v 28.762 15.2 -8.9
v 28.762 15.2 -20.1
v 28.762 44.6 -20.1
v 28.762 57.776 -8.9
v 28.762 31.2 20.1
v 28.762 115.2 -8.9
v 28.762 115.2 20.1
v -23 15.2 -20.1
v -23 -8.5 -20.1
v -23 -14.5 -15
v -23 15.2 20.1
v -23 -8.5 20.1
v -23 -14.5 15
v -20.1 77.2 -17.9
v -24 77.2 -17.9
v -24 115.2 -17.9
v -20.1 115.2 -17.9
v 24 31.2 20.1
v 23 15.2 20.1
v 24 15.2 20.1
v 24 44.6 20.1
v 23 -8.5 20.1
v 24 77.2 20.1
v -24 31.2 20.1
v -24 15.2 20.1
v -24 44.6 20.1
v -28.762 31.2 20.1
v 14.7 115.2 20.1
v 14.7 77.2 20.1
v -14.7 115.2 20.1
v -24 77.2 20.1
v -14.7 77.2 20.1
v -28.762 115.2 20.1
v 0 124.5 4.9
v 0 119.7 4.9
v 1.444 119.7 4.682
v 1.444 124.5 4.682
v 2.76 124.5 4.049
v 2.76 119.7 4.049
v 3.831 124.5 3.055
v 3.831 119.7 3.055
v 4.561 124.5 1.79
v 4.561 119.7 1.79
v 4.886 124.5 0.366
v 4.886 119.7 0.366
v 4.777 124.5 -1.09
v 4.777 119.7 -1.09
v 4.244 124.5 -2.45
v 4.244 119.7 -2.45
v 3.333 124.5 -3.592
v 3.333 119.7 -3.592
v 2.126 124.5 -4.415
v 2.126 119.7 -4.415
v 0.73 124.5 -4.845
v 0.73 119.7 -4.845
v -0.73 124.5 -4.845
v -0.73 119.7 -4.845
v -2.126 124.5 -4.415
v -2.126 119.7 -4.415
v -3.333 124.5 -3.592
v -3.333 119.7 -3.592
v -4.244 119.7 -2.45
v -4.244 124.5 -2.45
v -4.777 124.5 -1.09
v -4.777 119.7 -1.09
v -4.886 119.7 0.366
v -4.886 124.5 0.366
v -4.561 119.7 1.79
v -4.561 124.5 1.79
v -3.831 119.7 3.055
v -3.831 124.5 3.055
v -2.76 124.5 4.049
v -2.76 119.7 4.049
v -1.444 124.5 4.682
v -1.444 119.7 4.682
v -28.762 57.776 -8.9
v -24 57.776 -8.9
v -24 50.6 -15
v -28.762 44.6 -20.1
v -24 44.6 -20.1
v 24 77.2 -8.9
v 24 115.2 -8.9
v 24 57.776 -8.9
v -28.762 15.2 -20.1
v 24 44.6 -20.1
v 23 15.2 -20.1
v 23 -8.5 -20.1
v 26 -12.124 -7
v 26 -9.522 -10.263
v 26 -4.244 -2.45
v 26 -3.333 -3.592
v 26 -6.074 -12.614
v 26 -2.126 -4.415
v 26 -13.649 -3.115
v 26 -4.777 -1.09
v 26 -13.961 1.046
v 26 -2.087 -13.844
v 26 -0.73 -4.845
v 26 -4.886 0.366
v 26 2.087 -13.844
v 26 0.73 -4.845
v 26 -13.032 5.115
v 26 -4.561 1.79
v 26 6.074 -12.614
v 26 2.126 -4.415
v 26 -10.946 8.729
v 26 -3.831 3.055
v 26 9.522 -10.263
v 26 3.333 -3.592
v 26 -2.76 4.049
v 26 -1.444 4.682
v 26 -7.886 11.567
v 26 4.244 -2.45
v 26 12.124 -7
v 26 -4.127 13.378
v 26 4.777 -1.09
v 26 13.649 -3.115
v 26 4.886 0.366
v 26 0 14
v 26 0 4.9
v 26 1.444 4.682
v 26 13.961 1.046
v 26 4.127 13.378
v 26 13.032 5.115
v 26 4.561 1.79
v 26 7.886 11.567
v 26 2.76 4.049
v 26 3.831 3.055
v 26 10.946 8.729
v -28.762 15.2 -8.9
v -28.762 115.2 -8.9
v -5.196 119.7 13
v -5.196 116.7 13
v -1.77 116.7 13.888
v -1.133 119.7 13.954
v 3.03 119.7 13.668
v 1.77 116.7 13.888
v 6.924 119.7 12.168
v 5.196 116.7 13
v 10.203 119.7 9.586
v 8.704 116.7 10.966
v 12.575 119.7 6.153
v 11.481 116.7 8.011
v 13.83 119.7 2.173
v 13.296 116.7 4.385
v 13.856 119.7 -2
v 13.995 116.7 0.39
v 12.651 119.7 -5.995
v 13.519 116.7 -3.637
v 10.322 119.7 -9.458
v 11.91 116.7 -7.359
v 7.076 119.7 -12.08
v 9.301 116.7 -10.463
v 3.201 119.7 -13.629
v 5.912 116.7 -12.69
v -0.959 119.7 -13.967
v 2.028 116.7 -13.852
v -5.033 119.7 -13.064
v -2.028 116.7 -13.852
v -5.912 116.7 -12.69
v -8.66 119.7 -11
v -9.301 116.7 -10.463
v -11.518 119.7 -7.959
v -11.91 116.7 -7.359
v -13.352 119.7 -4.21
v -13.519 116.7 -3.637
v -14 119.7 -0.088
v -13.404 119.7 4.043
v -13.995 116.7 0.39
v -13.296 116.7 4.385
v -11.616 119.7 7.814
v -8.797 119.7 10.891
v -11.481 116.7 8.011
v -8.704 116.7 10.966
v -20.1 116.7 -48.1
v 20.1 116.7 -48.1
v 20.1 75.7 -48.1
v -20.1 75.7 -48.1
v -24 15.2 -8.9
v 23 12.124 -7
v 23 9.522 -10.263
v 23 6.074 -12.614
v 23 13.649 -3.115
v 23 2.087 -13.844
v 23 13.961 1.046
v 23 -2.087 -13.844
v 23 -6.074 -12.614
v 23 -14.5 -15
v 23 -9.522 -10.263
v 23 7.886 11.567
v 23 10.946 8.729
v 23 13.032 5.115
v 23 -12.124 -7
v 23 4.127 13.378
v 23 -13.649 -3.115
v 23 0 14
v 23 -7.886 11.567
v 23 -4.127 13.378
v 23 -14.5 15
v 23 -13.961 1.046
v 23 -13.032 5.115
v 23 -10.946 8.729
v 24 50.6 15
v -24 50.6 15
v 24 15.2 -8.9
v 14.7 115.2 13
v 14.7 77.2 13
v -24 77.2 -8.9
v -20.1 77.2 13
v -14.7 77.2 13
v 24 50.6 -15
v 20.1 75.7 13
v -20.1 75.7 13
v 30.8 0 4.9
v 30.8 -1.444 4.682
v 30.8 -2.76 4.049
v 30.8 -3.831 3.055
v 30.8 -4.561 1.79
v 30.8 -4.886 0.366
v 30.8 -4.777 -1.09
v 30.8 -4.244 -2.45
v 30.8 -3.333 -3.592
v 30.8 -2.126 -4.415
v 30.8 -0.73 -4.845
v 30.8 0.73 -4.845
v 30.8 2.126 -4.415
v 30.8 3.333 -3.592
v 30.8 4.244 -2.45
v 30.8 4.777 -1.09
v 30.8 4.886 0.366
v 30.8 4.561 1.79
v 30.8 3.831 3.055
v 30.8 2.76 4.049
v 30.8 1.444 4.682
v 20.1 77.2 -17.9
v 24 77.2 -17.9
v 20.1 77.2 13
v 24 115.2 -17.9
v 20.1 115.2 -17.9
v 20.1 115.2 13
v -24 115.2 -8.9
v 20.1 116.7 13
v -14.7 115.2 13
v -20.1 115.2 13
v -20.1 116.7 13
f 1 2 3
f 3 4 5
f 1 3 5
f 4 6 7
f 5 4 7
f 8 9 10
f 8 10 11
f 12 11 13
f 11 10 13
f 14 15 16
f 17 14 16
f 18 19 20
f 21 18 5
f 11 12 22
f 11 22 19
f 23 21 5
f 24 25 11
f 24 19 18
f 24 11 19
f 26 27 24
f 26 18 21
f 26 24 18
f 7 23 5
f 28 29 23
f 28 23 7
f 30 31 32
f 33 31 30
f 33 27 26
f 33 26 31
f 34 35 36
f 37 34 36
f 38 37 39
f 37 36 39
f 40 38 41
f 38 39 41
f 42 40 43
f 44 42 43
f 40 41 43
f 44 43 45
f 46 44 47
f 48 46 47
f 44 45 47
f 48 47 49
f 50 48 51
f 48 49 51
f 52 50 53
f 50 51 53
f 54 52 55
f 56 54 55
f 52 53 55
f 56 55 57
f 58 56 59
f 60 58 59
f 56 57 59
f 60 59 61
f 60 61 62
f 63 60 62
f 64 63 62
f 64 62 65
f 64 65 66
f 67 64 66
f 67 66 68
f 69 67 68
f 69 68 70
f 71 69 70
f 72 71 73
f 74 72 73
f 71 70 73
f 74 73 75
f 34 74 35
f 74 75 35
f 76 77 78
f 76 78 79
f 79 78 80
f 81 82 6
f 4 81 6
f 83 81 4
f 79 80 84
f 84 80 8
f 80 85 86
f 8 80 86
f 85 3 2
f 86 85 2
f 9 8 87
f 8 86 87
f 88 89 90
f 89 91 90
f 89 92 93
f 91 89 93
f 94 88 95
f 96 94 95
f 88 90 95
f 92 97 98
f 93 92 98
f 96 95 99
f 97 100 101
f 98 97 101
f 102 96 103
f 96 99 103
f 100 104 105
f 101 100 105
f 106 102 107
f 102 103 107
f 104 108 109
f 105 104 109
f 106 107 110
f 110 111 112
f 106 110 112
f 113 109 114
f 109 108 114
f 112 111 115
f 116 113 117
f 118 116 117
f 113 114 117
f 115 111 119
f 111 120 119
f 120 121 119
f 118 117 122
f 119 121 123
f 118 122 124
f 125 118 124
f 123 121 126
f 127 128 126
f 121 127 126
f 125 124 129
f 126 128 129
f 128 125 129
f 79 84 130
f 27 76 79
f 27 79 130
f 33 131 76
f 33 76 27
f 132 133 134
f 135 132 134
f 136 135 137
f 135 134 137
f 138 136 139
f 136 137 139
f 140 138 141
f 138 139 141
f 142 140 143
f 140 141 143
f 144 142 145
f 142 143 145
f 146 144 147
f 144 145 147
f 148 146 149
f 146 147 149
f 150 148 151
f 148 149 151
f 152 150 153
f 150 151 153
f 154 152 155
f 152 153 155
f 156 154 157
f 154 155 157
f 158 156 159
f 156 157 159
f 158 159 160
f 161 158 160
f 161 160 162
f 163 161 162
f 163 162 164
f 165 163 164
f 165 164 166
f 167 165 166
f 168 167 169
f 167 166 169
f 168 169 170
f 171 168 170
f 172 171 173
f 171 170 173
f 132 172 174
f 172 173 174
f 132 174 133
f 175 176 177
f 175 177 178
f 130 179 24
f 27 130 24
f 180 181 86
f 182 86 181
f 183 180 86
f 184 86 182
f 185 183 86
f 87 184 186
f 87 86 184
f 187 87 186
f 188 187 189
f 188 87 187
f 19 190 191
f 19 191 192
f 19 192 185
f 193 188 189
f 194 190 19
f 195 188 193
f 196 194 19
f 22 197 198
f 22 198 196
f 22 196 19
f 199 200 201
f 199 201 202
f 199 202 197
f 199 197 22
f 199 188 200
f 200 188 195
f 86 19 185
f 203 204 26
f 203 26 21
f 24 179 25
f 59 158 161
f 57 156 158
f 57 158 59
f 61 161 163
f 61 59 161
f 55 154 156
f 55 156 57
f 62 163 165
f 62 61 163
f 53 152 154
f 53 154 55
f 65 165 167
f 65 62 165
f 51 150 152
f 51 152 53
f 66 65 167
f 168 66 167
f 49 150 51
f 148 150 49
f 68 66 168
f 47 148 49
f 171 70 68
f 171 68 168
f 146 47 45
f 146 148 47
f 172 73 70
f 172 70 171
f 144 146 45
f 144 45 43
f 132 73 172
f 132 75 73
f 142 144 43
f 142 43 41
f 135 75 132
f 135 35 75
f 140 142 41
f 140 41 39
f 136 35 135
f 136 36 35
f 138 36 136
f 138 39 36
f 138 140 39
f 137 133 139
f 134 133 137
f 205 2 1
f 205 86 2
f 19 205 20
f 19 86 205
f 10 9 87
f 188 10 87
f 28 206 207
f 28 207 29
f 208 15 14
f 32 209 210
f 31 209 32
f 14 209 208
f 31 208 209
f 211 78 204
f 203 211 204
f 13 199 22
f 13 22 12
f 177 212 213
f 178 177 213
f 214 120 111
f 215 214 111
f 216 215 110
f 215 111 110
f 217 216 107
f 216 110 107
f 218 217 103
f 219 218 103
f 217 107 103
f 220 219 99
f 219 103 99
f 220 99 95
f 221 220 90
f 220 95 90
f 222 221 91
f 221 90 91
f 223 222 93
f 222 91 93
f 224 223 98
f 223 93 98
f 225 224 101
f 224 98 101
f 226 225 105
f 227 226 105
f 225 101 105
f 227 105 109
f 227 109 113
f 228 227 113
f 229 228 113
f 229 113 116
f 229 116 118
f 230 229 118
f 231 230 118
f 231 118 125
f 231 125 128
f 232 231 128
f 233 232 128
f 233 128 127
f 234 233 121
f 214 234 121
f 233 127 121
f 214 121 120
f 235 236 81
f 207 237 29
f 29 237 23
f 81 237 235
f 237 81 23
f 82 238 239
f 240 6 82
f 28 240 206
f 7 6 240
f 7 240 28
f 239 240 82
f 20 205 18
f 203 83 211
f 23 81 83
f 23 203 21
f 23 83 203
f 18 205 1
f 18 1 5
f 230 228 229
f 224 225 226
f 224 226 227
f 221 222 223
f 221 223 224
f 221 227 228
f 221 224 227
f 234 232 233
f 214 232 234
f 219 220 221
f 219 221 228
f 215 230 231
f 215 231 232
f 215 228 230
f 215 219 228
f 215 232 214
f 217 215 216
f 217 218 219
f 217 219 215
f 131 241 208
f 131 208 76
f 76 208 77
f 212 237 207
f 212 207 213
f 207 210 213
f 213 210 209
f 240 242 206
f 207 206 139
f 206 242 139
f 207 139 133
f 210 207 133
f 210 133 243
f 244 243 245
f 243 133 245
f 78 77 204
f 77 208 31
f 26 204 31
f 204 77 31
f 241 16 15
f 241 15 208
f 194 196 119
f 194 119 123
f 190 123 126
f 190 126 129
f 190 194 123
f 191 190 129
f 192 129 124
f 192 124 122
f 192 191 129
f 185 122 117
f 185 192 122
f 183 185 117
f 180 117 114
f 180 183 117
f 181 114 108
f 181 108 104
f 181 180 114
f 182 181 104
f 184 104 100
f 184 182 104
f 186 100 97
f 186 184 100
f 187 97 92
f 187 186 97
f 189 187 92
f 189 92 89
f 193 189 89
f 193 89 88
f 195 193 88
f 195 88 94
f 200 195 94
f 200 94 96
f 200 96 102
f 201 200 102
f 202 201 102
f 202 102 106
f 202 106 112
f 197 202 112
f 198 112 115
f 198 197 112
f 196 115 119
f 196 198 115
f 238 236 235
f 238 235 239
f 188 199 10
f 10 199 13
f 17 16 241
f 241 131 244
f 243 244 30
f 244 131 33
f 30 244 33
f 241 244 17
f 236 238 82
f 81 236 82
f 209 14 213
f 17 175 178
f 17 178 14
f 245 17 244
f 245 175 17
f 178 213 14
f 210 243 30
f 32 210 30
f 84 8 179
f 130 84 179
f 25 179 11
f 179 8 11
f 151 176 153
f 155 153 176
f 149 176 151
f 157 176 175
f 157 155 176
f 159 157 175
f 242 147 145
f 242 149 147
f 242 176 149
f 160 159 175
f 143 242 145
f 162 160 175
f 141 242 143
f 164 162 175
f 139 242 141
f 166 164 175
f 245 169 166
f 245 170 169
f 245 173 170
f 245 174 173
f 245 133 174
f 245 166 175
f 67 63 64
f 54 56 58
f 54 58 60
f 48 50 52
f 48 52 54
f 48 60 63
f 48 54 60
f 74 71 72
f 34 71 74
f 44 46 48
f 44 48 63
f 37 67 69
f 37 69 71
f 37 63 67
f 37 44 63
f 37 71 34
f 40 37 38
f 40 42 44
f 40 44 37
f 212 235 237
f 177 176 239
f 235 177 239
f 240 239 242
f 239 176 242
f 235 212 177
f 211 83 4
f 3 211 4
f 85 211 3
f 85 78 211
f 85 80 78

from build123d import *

# Parameters (mm, degrees)
SKETCH1_W                 = 46
SKETCH1_H                 = 40.2
BOSS_EXTRUDE1_DEPTH       = 65.1
SKETCH3_R                 = 14
BOSS_EXTRUDE2_DEPTH       = 3
SKETCH4_R                 = 4.9
BOSS_EXTRUDE3_DEPTH       = 4.8
SKETCH7_W                 = 40.2
SKETCH7_H                 = 35.4
BOSS_EXTRUDE6_DEPTH       = 1
CHAMFER1_SIZE             = 6
CHAMFER1_SIZE2            = 5.1
MIRROR3_START             = 44.200099823
MIRROR3_OUTLINE_W         = 50
MIRROR3_OUTLINE_H         = 11
MIRROR3_DEPTH             = 3.885890521
CHAMFER1_OF_MIRROR8_SIZE2 = 5.1
CHAMFER1_OF_MIRROR8_SIZE  = 6
BOSS_EXTRUDE7_DEPTH       = 4.7625
SKETCH9_W                 = 40.2
SKETCH9_H                 = 61.1
BOSS_EXTRUDE8_DEPTH       = 41
SKETCH10_W                = 38
SKETCH10_H                = 38
BOSS_EXTRUDE9_DEPTH       = 9.3
SKETCH11_R                = 14
BOSS_EXTRUDE10_DEPTH      = 3
SKETCH12_R                = 4.9
BOSS_EXTRUDE11_DEPTH      = 4.8


# Read off the part's stored shape, not the designer's step: Mirror3
with BuildPart() as part:
    # Sketch1 → Boss-Extrude1 (new body)
    with BuildSketch(Plane(origin=(0, -14.5, 0), x_dir=(-1, 0, 0), z_dir=(0, 1, 0))):
        Rectangle(SKETCH1_W, SKETCH1_H)
    extrude(amount=BOSS_EXTRUDE1_DEPTH)

    # Sketch3 → Boss-Extrude2 (add)
    with BuildSketch(Plane.ZY.offset(-23)):
        Circle(SKETCH3_R)
    extrude(amount=-BOSS_EXTRUDE2_DEPTH)

    # Sketch4 → Boss-Extrude3 (add)
    with BuildSketch(Plane(origin=(26, 0, 0), x_dir=(0, 0, -1), z_dir=(1, 0, 0))):
        with Locations(Location((0, 0, 0), (0, 0, 180))):
            Circle(SKETCH4_R)
    extrude(amount=BOSS_EXTRUDE3_DEPTH)

    # Sketch7 → Boss-Extrude6 (add)
    with BuildSketch(Plane.ZY.offset(23)):
        with Locations((0, 32.9)):
            Rectangle(SKETCH7_W, SKETCH7_H)
    boss_extrude6 = extrude(amount=BOSS_EXTRUDE6_DEPTH)

    # Mirror1: Boss-Extrude6 across plane
    add(boss_extrude6.mirror(Plane(origin=(0, 0, 0), x_dir=(0, 0, 1), z_dir=(1, 0, 0))))

    # Chamfer1
    chamfer1_edges = [part.edges().sort_by_distance(p)[0] for p in [
        (0, 50.6, 20.1),
    ]]
    chamfer1_side = [part.faces().sort_by_distance(p)[0] for p in [
        (0, 18.392982971, 20.1),
    ]]
    chamfer(chamfer1_edges, length=CHAMFER1_SIZE, length2=CHAMFER1_SIZE2, reference=chamfer1_side[0])

    # Mirror3 outline → Mirror3 (cut)
    with BuildSketch(Plane(origin=(0, 0, 0), x_dir=(1, 0, 0), z_dir=(0, 0.6476484200955404, -0.7619393177594594)).offset(MIRROR3_START)):
        with Locations((0, -24.5)):
            Rectangle(MIRROR3_OUTLINE_W, MIRROR3_OUTLINE_H)
    mirror3 = extrude(amount=MIRROR3_DEPTH, mode=Mode.SUBTRACT)

    # Mirror8: Mirror3 across plane
    add(mirror3.mirror(Plane.ZX.offset(18.05)), mode=Mode.SUBTRACT)

    # Chamfer1 of Mirror8
    chamfer1_of_mirror8_edges = [part.edges().sort_by_distance(p)[0] for p in [
        (0, -14.5, 20.1),
    ]]
    chamfer(chamfer1_of_mirror8_edges, length=CHAMFER1_OF_MIRROR8_SIZE, length2=CHAMFER1_OF_MIRROR8_SIZE2)

    # Sketch8 → Boss-Extrude7 (add)
    with BuildSketch(Plane(origin=(24, 0, 0), x_dir=(0, 0, -1), z_dir=(1, 0, 0))):
        Polygon((20.1, 15.2), (8.9, 15.2), (-20.1, 31.2), (-20.1, 115.2), (8.9, 115.2), (8.9, 57.776470588), (20.1, 44.6), align=None)
    boss_extrude7 = extrude(amount=BOSS_EXTRUDE7_DEPTH)

    # Mirror4: Boss-Extrude7 across plane
    add(boss_extrude7.mirror(Plane(origin=(0, 0, 0), x_dir=(0, 0, 1), z_dir=(1, 0, 0))))



with BuildPart() as body_2:
    # Sketch9 → Boss-Extrude8 (new body)
    with BuildSketch(Plane(origin=(0, 116.7, 0), x_dir=(-1, 0, 0), z_dir=(0, 1, 0))):
        with Locations((0, -17.55)):
            Rectangle(SKETCH9_W, SKETCH9_H)
    extrude(amount=-BOSS_EXTRUDE8_DEPTH)


with BuildPart() as part_1:
    add(part.part)

    add(body_2.part)  # Boss-Extrude9 merges body 2
    # Sketch10 → Boss-Extrude9 (add)
    with BuildSketch(Plane.ZY.offset(-24)):
        with Locations((1.1, 96.2)):
            Rectangle(SKETCH10_W, SKETCH10_H)
    boss_extrude9 = extrude(amount=BOSS_EXTRUDE9_DEPTH)

    # Mirror6: Boss-Extrude9 across plane
    add(boss_extrude9.mirror(Plane(origin=(0, 0, 0), x_dir=(0, 0, 1), z_dir=(1, 0, 0))))

    # Sketch11 → Boss-Extrude10 (add)
    with BuildSketch(Plane(origin=(0, 116.7, 0), x_dir=(-1, 0, 0), z_dir=(0, 1, 0))):
        with Locations(Location((0, 0, 0), (0, 0, 68.213210702))):
            Circle(SKETCH11_R)
    extrude(amount=BOSS_EXTRUDE10_DEPTH)

    # Sketch12 → Boss-Extrude11 (add)
    with BuildSketch(Plane(origin=(0, 119.7, 0), x_dir=(1, 0, 0), z_dir=(0, 1, 0))):
        with Locations(Location((0, 0, 0), (0, 0, 270))):
            Circle(SKETCH12_R)
    extrude(amount=BOSS_EXTRUDE11_DEPTH)


solid = part_1.part
